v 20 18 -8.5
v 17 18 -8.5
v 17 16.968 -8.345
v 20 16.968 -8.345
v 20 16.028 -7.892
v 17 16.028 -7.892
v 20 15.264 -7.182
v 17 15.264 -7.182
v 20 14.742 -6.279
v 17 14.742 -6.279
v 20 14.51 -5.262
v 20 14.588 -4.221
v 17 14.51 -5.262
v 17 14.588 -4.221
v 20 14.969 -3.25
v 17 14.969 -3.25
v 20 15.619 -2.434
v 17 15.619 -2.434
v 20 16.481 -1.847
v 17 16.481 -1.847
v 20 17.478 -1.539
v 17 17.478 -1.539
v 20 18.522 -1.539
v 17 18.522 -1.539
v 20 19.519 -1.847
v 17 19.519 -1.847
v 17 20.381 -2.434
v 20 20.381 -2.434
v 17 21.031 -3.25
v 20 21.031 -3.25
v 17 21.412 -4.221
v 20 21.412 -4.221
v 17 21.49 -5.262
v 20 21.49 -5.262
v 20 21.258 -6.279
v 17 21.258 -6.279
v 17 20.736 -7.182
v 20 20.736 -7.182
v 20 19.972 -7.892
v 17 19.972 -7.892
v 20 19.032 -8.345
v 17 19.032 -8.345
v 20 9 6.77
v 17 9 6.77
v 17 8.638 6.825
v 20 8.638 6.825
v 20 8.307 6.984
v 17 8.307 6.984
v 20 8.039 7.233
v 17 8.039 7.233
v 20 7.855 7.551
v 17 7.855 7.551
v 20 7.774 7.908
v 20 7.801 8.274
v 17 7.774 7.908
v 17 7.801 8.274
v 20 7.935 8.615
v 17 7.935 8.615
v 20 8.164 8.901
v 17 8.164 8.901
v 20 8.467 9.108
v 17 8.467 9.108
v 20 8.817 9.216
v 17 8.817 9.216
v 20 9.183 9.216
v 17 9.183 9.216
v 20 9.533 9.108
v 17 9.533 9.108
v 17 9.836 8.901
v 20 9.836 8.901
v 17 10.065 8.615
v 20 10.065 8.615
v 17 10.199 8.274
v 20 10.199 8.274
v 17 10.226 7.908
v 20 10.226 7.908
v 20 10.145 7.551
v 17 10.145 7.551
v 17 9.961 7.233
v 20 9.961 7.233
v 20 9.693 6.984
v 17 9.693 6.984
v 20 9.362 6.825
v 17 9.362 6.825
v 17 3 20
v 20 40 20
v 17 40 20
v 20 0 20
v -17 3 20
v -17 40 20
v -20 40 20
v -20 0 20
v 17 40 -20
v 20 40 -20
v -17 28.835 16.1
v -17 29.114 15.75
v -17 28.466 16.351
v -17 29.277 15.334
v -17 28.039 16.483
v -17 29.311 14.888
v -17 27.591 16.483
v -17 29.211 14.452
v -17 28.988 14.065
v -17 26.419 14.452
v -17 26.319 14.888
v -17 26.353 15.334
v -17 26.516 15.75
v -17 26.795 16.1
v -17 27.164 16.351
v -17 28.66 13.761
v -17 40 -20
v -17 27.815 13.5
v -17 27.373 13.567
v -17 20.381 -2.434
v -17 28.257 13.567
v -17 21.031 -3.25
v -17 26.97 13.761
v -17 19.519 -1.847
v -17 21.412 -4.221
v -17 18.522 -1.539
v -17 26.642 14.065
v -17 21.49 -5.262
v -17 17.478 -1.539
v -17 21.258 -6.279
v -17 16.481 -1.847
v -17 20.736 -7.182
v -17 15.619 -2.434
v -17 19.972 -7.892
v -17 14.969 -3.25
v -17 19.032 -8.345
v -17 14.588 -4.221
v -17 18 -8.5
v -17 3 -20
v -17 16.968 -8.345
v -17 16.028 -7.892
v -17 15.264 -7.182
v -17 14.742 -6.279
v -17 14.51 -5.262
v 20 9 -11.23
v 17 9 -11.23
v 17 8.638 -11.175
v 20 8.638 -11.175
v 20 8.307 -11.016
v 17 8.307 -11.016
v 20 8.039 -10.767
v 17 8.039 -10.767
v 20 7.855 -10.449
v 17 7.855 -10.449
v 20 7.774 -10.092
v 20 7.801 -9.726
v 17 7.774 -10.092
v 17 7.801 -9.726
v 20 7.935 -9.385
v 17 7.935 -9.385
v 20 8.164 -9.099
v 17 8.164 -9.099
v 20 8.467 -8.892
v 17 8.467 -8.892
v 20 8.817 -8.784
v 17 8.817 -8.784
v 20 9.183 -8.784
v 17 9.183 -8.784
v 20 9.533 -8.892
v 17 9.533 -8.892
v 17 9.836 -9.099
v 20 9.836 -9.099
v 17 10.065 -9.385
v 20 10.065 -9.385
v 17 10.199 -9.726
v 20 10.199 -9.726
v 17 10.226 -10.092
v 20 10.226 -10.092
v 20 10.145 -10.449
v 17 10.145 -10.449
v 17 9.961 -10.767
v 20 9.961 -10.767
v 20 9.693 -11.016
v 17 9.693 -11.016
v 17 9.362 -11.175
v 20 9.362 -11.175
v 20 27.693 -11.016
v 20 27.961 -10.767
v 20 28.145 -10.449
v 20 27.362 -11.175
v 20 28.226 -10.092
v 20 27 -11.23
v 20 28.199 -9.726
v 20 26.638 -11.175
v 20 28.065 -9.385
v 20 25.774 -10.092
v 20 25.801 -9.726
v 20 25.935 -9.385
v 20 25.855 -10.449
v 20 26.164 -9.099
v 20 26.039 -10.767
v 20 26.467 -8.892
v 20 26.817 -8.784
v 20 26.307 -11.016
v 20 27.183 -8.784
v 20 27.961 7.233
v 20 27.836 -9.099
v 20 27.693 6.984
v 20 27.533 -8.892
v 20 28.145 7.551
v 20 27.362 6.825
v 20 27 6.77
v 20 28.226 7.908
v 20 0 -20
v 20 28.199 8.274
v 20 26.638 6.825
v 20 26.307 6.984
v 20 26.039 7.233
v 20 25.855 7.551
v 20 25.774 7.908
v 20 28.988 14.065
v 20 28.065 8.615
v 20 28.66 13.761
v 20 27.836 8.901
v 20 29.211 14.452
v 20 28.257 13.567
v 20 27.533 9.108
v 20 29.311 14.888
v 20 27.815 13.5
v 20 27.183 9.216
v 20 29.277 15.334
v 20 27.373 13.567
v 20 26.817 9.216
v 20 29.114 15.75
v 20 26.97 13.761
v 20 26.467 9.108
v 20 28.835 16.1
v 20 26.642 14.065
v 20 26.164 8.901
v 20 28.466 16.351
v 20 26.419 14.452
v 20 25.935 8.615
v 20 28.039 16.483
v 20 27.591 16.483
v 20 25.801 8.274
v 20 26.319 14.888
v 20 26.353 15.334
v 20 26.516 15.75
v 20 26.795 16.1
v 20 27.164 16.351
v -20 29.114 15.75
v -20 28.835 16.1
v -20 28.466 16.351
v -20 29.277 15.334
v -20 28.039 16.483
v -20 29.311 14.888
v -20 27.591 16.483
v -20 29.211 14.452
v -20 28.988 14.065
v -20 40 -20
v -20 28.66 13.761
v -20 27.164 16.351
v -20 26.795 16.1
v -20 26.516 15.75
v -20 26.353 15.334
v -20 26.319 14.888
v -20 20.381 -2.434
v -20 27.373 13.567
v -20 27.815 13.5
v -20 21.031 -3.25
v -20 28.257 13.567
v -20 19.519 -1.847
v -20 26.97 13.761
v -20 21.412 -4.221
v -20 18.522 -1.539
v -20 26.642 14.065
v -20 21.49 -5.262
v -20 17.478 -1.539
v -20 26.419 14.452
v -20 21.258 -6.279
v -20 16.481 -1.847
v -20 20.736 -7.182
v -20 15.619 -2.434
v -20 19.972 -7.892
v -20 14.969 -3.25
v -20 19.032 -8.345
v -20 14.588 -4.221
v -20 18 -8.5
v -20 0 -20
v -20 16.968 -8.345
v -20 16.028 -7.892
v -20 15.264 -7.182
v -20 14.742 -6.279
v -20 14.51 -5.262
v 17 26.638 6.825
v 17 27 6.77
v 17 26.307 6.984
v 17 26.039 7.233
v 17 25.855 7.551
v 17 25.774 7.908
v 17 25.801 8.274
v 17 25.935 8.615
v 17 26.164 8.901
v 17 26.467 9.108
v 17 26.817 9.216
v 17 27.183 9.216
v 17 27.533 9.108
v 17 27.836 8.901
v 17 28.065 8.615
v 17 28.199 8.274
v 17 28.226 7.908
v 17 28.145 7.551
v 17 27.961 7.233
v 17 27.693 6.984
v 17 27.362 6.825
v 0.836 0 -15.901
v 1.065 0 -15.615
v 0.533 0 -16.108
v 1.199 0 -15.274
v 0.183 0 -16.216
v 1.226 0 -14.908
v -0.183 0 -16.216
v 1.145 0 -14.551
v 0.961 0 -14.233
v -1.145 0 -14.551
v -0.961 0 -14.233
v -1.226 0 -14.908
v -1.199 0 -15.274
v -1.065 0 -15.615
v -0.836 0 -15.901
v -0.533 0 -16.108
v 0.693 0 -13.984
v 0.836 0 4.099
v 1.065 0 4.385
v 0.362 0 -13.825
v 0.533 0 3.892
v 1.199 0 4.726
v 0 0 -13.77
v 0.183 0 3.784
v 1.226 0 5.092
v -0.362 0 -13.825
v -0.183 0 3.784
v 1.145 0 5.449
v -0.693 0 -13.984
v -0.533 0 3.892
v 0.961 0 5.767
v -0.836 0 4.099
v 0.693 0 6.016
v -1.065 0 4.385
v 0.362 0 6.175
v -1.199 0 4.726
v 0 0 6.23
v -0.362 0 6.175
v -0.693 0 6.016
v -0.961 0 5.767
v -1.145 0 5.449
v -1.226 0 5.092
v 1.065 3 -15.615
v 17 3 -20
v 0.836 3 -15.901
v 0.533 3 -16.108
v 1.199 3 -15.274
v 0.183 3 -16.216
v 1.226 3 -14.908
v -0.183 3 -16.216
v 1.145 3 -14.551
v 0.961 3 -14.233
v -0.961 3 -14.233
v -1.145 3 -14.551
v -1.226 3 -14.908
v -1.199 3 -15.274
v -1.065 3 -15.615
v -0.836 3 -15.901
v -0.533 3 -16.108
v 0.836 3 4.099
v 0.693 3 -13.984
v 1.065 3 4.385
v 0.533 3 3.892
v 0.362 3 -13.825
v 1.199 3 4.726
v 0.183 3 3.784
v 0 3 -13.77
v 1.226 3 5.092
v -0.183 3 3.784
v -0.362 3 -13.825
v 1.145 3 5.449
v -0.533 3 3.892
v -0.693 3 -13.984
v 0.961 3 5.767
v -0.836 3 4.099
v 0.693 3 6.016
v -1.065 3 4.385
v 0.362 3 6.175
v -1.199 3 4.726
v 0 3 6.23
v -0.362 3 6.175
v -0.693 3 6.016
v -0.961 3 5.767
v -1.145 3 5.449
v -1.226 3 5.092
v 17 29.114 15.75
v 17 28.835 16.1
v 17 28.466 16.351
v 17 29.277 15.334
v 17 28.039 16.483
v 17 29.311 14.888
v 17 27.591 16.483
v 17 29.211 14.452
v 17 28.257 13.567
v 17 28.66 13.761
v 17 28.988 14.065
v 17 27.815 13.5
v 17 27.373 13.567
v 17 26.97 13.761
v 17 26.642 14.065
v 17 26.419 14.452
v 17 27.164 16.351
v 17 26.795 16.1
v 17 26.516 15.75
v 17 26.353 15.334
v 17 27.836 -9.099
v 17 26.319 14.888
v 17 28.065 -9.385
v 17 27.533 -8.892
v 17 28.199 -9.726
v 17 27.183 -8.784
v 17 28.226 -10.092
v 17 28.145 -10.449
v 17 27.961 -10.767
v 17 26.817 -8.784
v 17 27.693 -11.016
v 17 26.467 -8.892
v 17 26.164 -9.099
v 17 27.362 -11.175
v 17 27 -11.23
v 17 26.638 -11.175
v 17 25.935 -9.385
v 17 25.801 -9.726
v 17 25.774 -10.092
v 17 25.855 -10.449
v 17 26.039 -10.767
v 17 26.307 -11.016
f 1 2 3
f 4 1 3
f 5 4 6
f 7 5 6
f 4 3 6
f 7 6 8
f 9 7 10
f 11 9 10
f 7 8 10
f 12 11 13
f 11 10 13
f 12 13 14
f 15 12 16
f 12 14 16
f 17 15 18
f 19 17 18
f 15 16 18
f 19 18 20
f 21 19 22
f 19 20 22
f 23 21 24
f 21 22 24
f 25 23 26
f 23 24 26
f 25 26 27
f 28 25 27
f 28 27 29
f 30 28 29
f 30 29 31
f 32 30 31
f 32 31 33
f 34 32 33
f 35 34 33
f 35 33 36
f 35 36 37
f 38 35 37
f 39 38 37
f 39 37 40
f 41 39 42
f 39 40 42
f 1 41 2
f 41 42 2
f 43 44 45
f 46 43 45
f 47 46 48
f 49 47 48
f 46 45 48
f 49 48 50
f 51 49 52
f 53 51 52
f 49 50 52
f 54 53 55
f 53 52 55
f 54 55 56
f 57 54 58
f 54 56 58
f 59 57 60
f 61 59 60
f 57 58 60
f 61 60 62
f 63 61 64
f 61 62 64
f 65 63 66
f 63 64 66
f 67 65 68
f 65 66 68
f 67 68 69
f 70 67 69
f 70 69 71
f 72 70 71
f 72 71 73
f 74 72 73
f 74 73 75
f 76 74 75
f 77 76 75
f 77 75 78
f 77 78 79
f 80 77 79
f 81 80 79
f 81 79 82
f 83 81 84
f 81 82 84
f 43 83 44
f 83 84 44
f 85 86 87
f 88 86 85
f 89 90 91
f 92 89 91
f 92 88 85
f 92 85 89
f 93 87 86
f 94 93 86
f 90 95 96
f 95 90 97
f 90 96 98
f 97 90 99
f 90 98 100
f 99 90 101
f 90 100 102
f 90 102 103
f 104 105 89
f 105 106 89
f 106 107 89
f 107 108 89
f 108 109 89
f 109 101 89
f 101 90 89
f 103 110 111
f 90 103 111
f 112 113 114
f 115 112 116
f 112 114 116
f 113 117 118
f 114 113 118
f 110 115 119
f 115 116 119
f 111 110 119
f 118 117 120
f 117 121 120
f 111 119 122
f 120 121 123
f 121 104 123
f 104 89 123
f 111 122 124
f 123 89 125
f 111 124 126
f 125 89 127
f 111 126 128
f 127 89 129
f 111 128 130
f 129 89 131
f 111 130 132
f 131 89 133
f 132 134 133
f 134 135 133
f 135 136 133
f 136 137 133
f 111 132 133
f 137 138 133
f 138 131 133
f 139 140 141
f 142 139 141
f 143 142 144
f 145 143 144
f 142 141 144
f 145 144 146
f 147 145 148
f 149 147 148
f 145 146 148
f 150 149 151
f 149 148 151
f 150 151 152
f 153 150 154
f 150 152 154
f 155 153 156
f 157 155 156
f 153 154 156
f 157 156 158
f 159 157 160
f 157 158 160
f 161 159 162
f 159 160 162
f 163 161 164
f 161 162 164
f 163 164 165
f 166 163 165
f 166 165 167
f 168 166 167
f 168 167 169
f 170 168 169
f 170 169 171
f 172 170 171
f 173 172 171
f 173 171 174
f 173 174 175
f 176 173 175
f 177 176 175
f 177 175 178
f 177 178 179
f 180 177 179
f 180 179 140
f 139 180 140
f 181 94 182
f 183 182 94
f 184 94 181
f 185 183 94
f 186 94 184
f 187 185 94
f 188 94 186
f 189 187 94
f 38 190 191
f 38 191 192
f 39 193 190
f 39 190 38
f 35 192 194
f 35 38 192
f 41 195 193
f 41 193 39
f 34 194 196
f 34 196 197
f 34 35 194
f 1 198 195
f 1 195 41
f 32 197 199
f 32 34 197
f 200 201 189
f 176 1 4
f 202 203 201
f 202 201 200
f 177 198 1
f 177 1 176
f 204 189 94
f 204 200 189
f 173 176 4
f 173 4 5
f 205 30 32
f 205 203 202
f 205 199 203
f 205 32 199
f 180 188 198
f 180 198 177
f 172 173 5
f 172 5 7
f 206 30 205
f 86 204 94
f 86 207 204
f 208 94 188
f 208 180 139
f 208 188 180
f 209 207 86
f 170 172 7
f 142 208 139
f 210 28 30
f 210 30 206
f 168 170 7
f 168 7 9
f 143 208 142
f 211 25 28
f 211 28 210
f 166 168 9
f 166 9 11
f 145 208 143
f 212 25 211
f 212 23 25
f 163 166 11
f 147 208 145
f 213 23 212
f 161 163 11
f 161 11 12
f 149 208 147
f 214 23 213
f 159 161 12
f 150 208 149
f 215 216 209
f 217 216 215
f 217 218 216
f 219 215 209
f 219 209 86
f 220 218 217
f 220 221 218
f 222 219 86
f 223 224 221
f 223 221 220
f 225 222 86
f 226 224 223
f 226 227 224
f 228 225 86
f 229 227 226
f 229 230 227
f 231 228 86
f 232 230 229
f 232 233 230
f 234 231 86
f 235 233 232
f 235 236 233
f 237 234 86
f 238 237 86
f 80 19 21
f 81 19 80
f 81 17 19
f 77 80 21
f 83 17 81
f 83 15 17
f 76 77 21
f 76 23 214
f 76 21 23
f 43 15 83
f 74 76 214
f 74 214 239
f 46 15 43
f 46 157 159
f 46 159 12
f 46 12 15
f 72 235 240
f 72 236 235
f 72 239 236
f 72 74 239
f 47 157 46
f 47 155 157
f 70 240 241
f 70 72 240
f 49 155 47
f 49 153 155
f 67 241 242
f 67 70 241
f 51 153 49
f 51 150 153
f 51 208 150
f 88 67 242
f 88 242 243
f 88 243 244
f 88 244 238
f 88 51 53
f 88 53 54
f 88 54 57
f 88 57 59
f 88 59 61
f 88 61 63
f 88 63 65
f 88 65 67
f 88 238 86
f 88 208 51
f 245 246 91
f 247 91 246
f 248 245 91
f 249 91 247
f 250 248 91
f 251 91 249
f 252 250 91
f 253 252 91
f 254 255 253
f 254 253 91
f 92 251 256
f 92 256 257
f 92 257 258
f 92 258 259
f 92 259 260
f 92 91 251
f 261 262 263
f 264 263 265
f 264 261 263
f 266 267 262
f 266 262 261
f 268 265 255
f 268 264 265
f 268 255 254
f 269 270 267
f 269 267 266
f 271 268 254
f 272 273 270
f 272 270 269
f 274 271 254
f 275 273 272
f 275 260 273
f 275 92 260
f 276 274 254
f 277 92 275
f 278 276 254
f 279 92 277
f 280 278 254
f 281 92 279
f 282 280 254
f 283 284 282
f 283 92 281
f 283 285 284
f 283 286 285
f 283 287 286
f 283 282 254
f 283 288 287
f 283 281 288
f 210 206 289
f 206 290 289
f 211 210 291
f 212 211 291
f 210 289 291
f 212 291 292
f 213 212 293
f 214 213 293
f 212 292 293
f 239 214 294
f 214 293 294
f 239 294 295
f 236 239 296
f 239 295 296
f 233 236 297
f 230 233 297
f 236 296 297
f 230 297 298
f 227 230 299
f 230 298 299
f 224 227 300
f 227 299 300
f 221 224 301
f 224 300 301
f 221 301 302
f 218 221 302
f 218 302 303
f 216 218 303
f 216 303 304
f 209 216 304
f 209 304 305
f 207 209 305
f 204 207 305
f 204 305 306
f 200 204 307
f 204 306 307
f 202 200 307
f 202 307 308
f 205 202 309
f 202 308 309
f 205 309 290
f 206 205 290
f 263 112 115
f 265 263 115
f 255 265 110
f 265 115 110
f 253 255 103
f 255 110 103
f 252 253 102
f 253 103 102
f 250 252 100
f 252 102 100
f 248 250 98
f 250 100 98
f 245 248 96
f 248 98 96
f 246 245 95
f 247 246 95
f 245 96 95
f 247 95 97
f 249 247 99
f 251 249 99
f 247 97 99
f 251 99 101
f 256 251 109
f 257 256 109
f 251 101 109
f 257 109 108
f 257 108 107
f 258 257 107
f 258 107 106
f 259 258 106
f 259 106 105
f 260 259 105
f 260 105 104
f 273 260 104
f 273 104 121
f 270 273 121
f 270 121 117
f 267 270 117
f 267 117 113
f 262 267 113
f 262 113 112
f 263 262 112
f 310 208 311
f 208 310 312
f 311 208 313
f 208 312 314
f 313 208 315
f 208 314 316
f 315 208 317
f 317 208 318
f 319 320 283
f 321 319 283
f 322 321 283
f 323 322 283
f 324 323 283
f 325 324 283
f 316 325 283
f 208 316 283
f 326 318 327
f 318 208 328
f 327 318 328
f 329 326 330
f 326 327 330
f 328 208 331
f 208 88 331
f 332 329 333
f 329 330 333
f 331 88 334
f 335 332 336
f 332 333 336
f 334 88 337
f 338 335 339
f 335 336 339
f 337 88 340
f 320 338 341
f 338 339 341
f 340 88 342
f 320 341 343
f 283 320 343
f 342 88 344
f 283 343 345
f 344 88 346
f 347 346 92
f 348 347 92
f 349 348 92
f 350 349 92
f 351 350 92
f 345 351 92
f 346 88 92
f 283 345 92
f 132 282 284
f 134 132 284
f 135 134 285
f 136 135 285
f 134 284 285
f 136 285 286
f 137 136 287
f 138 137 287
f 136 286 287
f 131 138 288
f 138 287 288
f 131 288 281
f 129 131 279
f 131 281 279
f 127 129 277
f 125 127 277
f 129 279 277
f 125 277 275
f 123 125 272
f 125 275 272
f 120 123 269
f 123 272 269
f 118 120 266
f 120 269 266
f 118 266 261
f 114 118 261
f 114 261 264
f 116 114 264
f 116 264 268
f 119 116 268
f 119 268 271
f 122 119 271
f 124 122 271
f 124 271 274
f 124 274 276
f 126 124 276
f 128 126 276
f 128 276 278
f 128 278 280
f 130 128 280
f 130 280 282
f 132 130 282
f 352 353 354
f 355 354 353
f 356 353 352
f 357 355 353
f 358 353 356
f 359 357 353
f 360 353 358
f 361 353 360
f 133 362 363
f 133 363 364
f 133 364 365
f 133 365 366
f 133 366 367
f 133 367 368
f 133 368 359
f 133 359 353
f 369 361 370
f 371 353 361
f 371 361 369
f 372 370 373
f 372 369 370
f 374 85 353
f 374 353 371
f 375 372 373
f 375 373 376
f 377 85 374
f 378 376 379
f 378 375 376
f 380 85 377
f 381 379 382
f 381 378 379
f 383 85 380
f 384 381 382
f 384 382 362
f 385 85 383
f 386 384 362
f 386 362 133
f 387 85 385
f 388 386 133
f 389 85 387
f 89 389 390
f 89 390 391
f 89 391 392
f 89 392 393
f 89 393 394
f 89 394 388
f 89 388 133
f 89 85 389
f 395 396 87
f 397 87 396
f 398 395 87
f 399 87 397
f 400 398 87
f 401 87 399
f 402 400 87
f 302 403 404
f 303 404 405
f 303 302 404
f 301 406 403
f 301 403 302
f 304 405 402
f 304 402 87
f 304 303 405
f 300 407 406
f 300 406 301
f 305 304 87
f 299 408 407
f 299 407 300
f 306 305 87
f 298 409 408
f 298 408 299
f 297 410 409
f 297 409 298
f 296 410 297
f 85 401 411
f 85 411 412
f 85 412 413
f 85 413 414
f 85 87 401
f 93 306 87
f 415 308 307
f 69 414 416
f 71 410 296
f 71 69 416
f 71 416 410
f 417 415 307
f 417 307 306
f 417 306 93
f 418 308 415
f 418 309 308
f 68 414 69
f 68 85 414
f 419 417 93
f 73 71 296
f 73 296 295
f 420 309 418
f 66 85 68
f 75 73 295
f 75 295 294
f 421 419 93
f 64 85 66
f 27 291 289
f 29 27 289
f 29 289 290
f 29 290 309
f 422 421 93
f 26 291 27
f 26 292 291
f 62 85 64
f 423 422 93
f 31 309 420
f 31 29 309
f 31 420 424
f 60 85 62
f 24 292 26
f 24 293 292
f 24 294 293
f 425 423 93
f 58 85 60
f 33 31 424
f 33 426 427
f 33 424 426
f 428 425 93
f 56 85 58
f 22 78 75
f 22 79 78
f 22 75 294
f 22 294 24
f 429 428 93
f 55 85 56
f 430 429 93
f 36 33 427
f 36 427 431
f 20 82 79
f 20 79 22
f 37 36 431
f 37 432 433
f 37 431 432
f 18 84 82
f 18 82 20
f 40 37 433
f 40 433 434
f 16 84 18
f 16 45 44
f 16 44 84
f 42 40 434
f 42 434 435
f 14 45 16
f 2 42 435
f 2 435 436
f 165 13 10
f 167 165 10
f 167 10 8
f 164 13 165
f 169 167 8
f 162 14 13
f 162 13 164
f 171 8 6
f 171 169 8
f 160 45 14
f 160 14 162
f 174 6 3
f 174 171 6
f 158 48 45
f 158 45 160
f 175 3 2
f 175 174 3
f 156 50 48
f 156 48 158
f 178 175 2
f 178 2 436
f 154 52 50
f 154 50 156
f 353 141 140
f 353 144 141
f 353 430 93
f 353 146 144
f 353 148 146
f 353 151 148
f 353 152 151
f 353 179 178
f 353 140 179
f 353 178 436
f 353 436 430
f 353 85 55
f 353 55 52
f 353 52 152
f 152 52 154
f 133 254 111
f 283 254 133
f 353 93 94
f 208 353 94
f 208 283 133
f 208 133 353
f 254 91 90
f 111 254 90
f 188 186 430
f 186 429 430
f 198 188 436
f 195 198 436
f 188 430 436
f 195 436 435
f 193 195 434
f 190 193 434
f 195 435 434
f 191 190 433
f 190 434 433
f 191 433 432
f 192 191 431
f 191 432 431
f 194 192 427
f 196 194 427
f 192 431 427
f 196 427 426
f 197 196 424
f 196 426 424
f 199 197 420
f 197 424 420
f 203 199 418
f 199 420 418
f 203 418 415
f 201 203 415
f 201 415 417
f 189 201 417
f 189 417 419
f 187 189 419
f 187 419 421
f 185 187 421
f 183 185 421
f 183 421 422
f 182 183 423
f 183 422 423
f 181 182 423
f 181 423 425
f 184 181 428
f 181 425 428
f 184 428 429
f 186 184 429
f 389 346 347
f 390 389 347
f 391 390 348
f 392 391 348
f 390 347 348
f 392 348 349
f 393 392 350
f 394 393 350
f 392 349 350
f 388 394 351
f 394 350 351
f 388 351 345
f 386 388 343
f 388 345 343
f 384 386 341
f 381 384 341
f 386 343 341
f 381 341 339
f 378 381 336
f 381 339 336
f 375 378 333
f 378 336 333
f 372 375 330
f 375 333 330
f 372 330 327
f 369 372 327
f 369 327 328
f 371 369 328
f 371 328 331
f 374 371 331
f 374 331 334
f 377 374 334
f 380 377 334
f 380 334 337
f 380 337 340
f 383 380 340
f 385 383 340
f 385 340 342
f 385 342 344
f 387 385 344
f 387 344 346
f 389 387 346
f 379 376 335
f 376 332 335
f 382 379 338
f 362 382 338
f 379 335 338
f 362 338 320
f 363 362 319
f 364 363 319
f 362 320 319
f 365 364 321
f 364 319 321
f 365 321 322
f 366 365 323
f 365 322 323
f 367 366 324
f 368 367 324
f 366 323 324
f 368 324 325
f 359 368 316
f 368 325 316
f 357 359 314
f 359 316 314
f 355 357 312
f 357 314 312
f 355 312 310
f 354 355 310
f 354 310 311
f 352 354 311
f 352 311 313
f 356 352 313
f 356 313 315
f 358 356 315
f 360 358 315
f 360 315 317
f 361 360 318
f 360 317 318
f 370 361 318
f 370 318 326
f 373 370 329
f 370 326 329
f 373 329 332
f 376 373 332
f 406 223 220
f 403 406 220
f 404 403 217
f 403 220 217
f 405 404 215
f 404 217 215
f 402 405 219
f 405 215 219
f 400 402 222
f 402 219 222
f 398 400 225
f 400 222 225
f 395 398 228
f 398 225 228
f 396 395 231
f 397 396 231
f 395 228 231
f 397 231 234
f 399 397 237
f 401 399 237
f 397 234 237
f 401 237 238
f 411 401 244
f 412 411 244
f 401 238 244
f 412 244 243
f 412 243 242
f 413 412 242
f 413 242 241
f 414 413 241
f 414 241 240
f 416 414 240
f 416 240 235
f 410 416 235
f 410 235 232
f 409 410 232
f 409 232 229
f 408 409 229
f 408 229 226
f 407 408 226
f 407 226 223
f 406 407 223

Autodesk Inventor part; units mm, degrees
ref_plane "YZ Plane" through (0, 0, 0) normal (1, 0, 0) x (0, 1, 0)
ref_plane "XZ Plane" through (0, 0, 0) normal (0, 1, 0) x (-1, 0, 0)
ref_plane "XY Plane" through (0, 0, 0) normal (0, 0, 1) x (1, 0, 0)
sketch "スケッチ1" plane through (0, 0, 0) normal (0, 1, 0) x (-1, 0, 0)
  line L0 (20, -20) -> (-20, -20)
  line L1 (-20, -20) -> (-20, 20)
  line L2 (-20, 20) -> (20, 20)
  line L3 (20, 20) -> (20, -20)
  line L4 (-20, 20) -> (20, -20) construction
  line L5 (-20, -20) -> (20, 20) construction
  point P0 (0, 0)
  point P1 (0, 0)
  dimension "d0" = 40
  dimension "d1" = 40
extrude "押し出し1" add sketch "スケッチ1" along normal blind 3
sketch "スケッチ2" plane through (0, 3, 0) normal (0, 1, 0) x (1, 0, 0)
  line L0 (-20, -20) -> (20, -20) projected
  line L1 (20, -20) -> (20, 20) projected
  line L2 (20, 20) -> (-20, 20) projected
  line L3 (-20, 20) -> (-20, -20) projected
  line L4 (-20, -20) -> (20, -20) projected
  line L5 (-20, -20) -> (-17, -20)
  line L6 (-17, -20) -> (-17, 20)
  line L7 (-17, 20) -> (-20, 20)
  line L8 (-20, 20) -> (-20, -20)
  line L9 (20, -20) -> (20, 20) projected
  line L10 (20, -20) -> (17, -20)
  line L11 (17, -20) -> (17, 20)
  line L12 (17, 20) -> (20, 20)
  line L13 (20, 20) -> (20, -20)
  line L14 (20, 20) -> (-20, 20) projected
  point P0 (0, 0)
  point P1 (-17, 20)
  dimension "d4" = 3
  dimension "d5" = 3
extrude "押し出し2" add sketch "スケッチ2" along normal blind 40 from surface at -3 contours L3 L2 L6 L0 | L11 L2 L1 L0
sketch "スケッチ3" plane through (20, 0, 20) normal (1, 0, 0) x (0, 0, -1)
  line L0 (0, 3) -> (40, 3)
  line L1 (25, 18) -> (40, 18) construction
  line L2 (40, 40) -> (40, 3) construction
  line L3 (25, 18) -> (-0.078171, 18) construction
  point P0 (20, 0)
  dimension "d8" = 15
  dimension "d50" = 15
hole "穴1" at (20, 18, -5) direction (-1, 0, 0) diameter 7 end through all
sketch "スケッチ5" plane through (20, 0, 20) normal (1, 0, 0) x (0, 0, -1)
  line L0 (0, 0) -> (0, 40) projected
  line L1 (0, 0) -> (40, 0) projected
  line L2 (36, 33) -> (6, 33)
  line L3 (6, 33) -> (6, 3)
  line L4 (6, 3) -> (36, 3)
  line L5 (36, 3) -> (36, 33)
  line L6 (36, 33) -> (6, 3) construction
  line L7 (36, 3) -> (6, 33) construction
  line L8 (36, 18) -> (6, 18)
  circle A0 centre (25, 18) radius 3.5 projected
  point P0 (20, 0)
  point P1 (21, 18)
  point P2 (30, 27)
  point P3 (12, 27)
  point P4 (21, 18)
  point P5 (12, 9)
  point P6 (21, 18)
  point P7 (30, 9)
  point P8 (21, 18)
  point P9 (30, 27)
  dimension "d20" = 30
  dimension "d21" = 30
  dimension "d23" = 6
  dimension "d24" = 6
  dimension "d27" = 360
  dimension "d40" = 4
hole "穴2" at (20, 27, -10) at (20, 9, -10) at (20, 27, 8) at (20, 9, 8) direction (-1, 0, 0) diameter 2.459 depth 3 thread size "M3x0.5" class "6H" standard "ISO Metric profile"
sketch "スケッチ6" plane through (0, 3, 0) normal (0, 1, 0) x (1, 0, 0)
  line L0 (17, 20) -> (-17, 20) projected
  point P0 (0, 0)
  point P1 (0, 15)
  point P2 (0, -5)
  point P3 (0, 20)
  dimension "d41" = 5
  dimension "d42" = 20
hole "穴3" at (0, 3, -15) at (0, 3, 5) direction (0, -1, 0) diameter 2.459 depth 3 thread size "M3x0.5" class "6H" standard "ISO Metric profile"
sketch "スケッチ7" plane through (20, 0, 20) normal (1, 0, 0) x (0, 0, -1)
  circle A0 centre (25, 18) radius 3.5
  line L0 (25, 18) -> (-12.331112, 18)
  line L1 (-6.275173, 36.05673) -> (25, 18)
  circle A1 centre (5, 27.814955) radius 1.5
  line L2 (0, 0) -> (0, 40)
  point P0 (20, 0)
  dimension "d51" = 30
  dimension "d52" = 3
  dimension "d53" = 5
extrude "押し出し4" cut sketch "スケッチ7" against normal up to surface (40 mm away) contours A1
equation "\"d54\" = d53"
properties part number "hand" material "アルミニウム 6061"
